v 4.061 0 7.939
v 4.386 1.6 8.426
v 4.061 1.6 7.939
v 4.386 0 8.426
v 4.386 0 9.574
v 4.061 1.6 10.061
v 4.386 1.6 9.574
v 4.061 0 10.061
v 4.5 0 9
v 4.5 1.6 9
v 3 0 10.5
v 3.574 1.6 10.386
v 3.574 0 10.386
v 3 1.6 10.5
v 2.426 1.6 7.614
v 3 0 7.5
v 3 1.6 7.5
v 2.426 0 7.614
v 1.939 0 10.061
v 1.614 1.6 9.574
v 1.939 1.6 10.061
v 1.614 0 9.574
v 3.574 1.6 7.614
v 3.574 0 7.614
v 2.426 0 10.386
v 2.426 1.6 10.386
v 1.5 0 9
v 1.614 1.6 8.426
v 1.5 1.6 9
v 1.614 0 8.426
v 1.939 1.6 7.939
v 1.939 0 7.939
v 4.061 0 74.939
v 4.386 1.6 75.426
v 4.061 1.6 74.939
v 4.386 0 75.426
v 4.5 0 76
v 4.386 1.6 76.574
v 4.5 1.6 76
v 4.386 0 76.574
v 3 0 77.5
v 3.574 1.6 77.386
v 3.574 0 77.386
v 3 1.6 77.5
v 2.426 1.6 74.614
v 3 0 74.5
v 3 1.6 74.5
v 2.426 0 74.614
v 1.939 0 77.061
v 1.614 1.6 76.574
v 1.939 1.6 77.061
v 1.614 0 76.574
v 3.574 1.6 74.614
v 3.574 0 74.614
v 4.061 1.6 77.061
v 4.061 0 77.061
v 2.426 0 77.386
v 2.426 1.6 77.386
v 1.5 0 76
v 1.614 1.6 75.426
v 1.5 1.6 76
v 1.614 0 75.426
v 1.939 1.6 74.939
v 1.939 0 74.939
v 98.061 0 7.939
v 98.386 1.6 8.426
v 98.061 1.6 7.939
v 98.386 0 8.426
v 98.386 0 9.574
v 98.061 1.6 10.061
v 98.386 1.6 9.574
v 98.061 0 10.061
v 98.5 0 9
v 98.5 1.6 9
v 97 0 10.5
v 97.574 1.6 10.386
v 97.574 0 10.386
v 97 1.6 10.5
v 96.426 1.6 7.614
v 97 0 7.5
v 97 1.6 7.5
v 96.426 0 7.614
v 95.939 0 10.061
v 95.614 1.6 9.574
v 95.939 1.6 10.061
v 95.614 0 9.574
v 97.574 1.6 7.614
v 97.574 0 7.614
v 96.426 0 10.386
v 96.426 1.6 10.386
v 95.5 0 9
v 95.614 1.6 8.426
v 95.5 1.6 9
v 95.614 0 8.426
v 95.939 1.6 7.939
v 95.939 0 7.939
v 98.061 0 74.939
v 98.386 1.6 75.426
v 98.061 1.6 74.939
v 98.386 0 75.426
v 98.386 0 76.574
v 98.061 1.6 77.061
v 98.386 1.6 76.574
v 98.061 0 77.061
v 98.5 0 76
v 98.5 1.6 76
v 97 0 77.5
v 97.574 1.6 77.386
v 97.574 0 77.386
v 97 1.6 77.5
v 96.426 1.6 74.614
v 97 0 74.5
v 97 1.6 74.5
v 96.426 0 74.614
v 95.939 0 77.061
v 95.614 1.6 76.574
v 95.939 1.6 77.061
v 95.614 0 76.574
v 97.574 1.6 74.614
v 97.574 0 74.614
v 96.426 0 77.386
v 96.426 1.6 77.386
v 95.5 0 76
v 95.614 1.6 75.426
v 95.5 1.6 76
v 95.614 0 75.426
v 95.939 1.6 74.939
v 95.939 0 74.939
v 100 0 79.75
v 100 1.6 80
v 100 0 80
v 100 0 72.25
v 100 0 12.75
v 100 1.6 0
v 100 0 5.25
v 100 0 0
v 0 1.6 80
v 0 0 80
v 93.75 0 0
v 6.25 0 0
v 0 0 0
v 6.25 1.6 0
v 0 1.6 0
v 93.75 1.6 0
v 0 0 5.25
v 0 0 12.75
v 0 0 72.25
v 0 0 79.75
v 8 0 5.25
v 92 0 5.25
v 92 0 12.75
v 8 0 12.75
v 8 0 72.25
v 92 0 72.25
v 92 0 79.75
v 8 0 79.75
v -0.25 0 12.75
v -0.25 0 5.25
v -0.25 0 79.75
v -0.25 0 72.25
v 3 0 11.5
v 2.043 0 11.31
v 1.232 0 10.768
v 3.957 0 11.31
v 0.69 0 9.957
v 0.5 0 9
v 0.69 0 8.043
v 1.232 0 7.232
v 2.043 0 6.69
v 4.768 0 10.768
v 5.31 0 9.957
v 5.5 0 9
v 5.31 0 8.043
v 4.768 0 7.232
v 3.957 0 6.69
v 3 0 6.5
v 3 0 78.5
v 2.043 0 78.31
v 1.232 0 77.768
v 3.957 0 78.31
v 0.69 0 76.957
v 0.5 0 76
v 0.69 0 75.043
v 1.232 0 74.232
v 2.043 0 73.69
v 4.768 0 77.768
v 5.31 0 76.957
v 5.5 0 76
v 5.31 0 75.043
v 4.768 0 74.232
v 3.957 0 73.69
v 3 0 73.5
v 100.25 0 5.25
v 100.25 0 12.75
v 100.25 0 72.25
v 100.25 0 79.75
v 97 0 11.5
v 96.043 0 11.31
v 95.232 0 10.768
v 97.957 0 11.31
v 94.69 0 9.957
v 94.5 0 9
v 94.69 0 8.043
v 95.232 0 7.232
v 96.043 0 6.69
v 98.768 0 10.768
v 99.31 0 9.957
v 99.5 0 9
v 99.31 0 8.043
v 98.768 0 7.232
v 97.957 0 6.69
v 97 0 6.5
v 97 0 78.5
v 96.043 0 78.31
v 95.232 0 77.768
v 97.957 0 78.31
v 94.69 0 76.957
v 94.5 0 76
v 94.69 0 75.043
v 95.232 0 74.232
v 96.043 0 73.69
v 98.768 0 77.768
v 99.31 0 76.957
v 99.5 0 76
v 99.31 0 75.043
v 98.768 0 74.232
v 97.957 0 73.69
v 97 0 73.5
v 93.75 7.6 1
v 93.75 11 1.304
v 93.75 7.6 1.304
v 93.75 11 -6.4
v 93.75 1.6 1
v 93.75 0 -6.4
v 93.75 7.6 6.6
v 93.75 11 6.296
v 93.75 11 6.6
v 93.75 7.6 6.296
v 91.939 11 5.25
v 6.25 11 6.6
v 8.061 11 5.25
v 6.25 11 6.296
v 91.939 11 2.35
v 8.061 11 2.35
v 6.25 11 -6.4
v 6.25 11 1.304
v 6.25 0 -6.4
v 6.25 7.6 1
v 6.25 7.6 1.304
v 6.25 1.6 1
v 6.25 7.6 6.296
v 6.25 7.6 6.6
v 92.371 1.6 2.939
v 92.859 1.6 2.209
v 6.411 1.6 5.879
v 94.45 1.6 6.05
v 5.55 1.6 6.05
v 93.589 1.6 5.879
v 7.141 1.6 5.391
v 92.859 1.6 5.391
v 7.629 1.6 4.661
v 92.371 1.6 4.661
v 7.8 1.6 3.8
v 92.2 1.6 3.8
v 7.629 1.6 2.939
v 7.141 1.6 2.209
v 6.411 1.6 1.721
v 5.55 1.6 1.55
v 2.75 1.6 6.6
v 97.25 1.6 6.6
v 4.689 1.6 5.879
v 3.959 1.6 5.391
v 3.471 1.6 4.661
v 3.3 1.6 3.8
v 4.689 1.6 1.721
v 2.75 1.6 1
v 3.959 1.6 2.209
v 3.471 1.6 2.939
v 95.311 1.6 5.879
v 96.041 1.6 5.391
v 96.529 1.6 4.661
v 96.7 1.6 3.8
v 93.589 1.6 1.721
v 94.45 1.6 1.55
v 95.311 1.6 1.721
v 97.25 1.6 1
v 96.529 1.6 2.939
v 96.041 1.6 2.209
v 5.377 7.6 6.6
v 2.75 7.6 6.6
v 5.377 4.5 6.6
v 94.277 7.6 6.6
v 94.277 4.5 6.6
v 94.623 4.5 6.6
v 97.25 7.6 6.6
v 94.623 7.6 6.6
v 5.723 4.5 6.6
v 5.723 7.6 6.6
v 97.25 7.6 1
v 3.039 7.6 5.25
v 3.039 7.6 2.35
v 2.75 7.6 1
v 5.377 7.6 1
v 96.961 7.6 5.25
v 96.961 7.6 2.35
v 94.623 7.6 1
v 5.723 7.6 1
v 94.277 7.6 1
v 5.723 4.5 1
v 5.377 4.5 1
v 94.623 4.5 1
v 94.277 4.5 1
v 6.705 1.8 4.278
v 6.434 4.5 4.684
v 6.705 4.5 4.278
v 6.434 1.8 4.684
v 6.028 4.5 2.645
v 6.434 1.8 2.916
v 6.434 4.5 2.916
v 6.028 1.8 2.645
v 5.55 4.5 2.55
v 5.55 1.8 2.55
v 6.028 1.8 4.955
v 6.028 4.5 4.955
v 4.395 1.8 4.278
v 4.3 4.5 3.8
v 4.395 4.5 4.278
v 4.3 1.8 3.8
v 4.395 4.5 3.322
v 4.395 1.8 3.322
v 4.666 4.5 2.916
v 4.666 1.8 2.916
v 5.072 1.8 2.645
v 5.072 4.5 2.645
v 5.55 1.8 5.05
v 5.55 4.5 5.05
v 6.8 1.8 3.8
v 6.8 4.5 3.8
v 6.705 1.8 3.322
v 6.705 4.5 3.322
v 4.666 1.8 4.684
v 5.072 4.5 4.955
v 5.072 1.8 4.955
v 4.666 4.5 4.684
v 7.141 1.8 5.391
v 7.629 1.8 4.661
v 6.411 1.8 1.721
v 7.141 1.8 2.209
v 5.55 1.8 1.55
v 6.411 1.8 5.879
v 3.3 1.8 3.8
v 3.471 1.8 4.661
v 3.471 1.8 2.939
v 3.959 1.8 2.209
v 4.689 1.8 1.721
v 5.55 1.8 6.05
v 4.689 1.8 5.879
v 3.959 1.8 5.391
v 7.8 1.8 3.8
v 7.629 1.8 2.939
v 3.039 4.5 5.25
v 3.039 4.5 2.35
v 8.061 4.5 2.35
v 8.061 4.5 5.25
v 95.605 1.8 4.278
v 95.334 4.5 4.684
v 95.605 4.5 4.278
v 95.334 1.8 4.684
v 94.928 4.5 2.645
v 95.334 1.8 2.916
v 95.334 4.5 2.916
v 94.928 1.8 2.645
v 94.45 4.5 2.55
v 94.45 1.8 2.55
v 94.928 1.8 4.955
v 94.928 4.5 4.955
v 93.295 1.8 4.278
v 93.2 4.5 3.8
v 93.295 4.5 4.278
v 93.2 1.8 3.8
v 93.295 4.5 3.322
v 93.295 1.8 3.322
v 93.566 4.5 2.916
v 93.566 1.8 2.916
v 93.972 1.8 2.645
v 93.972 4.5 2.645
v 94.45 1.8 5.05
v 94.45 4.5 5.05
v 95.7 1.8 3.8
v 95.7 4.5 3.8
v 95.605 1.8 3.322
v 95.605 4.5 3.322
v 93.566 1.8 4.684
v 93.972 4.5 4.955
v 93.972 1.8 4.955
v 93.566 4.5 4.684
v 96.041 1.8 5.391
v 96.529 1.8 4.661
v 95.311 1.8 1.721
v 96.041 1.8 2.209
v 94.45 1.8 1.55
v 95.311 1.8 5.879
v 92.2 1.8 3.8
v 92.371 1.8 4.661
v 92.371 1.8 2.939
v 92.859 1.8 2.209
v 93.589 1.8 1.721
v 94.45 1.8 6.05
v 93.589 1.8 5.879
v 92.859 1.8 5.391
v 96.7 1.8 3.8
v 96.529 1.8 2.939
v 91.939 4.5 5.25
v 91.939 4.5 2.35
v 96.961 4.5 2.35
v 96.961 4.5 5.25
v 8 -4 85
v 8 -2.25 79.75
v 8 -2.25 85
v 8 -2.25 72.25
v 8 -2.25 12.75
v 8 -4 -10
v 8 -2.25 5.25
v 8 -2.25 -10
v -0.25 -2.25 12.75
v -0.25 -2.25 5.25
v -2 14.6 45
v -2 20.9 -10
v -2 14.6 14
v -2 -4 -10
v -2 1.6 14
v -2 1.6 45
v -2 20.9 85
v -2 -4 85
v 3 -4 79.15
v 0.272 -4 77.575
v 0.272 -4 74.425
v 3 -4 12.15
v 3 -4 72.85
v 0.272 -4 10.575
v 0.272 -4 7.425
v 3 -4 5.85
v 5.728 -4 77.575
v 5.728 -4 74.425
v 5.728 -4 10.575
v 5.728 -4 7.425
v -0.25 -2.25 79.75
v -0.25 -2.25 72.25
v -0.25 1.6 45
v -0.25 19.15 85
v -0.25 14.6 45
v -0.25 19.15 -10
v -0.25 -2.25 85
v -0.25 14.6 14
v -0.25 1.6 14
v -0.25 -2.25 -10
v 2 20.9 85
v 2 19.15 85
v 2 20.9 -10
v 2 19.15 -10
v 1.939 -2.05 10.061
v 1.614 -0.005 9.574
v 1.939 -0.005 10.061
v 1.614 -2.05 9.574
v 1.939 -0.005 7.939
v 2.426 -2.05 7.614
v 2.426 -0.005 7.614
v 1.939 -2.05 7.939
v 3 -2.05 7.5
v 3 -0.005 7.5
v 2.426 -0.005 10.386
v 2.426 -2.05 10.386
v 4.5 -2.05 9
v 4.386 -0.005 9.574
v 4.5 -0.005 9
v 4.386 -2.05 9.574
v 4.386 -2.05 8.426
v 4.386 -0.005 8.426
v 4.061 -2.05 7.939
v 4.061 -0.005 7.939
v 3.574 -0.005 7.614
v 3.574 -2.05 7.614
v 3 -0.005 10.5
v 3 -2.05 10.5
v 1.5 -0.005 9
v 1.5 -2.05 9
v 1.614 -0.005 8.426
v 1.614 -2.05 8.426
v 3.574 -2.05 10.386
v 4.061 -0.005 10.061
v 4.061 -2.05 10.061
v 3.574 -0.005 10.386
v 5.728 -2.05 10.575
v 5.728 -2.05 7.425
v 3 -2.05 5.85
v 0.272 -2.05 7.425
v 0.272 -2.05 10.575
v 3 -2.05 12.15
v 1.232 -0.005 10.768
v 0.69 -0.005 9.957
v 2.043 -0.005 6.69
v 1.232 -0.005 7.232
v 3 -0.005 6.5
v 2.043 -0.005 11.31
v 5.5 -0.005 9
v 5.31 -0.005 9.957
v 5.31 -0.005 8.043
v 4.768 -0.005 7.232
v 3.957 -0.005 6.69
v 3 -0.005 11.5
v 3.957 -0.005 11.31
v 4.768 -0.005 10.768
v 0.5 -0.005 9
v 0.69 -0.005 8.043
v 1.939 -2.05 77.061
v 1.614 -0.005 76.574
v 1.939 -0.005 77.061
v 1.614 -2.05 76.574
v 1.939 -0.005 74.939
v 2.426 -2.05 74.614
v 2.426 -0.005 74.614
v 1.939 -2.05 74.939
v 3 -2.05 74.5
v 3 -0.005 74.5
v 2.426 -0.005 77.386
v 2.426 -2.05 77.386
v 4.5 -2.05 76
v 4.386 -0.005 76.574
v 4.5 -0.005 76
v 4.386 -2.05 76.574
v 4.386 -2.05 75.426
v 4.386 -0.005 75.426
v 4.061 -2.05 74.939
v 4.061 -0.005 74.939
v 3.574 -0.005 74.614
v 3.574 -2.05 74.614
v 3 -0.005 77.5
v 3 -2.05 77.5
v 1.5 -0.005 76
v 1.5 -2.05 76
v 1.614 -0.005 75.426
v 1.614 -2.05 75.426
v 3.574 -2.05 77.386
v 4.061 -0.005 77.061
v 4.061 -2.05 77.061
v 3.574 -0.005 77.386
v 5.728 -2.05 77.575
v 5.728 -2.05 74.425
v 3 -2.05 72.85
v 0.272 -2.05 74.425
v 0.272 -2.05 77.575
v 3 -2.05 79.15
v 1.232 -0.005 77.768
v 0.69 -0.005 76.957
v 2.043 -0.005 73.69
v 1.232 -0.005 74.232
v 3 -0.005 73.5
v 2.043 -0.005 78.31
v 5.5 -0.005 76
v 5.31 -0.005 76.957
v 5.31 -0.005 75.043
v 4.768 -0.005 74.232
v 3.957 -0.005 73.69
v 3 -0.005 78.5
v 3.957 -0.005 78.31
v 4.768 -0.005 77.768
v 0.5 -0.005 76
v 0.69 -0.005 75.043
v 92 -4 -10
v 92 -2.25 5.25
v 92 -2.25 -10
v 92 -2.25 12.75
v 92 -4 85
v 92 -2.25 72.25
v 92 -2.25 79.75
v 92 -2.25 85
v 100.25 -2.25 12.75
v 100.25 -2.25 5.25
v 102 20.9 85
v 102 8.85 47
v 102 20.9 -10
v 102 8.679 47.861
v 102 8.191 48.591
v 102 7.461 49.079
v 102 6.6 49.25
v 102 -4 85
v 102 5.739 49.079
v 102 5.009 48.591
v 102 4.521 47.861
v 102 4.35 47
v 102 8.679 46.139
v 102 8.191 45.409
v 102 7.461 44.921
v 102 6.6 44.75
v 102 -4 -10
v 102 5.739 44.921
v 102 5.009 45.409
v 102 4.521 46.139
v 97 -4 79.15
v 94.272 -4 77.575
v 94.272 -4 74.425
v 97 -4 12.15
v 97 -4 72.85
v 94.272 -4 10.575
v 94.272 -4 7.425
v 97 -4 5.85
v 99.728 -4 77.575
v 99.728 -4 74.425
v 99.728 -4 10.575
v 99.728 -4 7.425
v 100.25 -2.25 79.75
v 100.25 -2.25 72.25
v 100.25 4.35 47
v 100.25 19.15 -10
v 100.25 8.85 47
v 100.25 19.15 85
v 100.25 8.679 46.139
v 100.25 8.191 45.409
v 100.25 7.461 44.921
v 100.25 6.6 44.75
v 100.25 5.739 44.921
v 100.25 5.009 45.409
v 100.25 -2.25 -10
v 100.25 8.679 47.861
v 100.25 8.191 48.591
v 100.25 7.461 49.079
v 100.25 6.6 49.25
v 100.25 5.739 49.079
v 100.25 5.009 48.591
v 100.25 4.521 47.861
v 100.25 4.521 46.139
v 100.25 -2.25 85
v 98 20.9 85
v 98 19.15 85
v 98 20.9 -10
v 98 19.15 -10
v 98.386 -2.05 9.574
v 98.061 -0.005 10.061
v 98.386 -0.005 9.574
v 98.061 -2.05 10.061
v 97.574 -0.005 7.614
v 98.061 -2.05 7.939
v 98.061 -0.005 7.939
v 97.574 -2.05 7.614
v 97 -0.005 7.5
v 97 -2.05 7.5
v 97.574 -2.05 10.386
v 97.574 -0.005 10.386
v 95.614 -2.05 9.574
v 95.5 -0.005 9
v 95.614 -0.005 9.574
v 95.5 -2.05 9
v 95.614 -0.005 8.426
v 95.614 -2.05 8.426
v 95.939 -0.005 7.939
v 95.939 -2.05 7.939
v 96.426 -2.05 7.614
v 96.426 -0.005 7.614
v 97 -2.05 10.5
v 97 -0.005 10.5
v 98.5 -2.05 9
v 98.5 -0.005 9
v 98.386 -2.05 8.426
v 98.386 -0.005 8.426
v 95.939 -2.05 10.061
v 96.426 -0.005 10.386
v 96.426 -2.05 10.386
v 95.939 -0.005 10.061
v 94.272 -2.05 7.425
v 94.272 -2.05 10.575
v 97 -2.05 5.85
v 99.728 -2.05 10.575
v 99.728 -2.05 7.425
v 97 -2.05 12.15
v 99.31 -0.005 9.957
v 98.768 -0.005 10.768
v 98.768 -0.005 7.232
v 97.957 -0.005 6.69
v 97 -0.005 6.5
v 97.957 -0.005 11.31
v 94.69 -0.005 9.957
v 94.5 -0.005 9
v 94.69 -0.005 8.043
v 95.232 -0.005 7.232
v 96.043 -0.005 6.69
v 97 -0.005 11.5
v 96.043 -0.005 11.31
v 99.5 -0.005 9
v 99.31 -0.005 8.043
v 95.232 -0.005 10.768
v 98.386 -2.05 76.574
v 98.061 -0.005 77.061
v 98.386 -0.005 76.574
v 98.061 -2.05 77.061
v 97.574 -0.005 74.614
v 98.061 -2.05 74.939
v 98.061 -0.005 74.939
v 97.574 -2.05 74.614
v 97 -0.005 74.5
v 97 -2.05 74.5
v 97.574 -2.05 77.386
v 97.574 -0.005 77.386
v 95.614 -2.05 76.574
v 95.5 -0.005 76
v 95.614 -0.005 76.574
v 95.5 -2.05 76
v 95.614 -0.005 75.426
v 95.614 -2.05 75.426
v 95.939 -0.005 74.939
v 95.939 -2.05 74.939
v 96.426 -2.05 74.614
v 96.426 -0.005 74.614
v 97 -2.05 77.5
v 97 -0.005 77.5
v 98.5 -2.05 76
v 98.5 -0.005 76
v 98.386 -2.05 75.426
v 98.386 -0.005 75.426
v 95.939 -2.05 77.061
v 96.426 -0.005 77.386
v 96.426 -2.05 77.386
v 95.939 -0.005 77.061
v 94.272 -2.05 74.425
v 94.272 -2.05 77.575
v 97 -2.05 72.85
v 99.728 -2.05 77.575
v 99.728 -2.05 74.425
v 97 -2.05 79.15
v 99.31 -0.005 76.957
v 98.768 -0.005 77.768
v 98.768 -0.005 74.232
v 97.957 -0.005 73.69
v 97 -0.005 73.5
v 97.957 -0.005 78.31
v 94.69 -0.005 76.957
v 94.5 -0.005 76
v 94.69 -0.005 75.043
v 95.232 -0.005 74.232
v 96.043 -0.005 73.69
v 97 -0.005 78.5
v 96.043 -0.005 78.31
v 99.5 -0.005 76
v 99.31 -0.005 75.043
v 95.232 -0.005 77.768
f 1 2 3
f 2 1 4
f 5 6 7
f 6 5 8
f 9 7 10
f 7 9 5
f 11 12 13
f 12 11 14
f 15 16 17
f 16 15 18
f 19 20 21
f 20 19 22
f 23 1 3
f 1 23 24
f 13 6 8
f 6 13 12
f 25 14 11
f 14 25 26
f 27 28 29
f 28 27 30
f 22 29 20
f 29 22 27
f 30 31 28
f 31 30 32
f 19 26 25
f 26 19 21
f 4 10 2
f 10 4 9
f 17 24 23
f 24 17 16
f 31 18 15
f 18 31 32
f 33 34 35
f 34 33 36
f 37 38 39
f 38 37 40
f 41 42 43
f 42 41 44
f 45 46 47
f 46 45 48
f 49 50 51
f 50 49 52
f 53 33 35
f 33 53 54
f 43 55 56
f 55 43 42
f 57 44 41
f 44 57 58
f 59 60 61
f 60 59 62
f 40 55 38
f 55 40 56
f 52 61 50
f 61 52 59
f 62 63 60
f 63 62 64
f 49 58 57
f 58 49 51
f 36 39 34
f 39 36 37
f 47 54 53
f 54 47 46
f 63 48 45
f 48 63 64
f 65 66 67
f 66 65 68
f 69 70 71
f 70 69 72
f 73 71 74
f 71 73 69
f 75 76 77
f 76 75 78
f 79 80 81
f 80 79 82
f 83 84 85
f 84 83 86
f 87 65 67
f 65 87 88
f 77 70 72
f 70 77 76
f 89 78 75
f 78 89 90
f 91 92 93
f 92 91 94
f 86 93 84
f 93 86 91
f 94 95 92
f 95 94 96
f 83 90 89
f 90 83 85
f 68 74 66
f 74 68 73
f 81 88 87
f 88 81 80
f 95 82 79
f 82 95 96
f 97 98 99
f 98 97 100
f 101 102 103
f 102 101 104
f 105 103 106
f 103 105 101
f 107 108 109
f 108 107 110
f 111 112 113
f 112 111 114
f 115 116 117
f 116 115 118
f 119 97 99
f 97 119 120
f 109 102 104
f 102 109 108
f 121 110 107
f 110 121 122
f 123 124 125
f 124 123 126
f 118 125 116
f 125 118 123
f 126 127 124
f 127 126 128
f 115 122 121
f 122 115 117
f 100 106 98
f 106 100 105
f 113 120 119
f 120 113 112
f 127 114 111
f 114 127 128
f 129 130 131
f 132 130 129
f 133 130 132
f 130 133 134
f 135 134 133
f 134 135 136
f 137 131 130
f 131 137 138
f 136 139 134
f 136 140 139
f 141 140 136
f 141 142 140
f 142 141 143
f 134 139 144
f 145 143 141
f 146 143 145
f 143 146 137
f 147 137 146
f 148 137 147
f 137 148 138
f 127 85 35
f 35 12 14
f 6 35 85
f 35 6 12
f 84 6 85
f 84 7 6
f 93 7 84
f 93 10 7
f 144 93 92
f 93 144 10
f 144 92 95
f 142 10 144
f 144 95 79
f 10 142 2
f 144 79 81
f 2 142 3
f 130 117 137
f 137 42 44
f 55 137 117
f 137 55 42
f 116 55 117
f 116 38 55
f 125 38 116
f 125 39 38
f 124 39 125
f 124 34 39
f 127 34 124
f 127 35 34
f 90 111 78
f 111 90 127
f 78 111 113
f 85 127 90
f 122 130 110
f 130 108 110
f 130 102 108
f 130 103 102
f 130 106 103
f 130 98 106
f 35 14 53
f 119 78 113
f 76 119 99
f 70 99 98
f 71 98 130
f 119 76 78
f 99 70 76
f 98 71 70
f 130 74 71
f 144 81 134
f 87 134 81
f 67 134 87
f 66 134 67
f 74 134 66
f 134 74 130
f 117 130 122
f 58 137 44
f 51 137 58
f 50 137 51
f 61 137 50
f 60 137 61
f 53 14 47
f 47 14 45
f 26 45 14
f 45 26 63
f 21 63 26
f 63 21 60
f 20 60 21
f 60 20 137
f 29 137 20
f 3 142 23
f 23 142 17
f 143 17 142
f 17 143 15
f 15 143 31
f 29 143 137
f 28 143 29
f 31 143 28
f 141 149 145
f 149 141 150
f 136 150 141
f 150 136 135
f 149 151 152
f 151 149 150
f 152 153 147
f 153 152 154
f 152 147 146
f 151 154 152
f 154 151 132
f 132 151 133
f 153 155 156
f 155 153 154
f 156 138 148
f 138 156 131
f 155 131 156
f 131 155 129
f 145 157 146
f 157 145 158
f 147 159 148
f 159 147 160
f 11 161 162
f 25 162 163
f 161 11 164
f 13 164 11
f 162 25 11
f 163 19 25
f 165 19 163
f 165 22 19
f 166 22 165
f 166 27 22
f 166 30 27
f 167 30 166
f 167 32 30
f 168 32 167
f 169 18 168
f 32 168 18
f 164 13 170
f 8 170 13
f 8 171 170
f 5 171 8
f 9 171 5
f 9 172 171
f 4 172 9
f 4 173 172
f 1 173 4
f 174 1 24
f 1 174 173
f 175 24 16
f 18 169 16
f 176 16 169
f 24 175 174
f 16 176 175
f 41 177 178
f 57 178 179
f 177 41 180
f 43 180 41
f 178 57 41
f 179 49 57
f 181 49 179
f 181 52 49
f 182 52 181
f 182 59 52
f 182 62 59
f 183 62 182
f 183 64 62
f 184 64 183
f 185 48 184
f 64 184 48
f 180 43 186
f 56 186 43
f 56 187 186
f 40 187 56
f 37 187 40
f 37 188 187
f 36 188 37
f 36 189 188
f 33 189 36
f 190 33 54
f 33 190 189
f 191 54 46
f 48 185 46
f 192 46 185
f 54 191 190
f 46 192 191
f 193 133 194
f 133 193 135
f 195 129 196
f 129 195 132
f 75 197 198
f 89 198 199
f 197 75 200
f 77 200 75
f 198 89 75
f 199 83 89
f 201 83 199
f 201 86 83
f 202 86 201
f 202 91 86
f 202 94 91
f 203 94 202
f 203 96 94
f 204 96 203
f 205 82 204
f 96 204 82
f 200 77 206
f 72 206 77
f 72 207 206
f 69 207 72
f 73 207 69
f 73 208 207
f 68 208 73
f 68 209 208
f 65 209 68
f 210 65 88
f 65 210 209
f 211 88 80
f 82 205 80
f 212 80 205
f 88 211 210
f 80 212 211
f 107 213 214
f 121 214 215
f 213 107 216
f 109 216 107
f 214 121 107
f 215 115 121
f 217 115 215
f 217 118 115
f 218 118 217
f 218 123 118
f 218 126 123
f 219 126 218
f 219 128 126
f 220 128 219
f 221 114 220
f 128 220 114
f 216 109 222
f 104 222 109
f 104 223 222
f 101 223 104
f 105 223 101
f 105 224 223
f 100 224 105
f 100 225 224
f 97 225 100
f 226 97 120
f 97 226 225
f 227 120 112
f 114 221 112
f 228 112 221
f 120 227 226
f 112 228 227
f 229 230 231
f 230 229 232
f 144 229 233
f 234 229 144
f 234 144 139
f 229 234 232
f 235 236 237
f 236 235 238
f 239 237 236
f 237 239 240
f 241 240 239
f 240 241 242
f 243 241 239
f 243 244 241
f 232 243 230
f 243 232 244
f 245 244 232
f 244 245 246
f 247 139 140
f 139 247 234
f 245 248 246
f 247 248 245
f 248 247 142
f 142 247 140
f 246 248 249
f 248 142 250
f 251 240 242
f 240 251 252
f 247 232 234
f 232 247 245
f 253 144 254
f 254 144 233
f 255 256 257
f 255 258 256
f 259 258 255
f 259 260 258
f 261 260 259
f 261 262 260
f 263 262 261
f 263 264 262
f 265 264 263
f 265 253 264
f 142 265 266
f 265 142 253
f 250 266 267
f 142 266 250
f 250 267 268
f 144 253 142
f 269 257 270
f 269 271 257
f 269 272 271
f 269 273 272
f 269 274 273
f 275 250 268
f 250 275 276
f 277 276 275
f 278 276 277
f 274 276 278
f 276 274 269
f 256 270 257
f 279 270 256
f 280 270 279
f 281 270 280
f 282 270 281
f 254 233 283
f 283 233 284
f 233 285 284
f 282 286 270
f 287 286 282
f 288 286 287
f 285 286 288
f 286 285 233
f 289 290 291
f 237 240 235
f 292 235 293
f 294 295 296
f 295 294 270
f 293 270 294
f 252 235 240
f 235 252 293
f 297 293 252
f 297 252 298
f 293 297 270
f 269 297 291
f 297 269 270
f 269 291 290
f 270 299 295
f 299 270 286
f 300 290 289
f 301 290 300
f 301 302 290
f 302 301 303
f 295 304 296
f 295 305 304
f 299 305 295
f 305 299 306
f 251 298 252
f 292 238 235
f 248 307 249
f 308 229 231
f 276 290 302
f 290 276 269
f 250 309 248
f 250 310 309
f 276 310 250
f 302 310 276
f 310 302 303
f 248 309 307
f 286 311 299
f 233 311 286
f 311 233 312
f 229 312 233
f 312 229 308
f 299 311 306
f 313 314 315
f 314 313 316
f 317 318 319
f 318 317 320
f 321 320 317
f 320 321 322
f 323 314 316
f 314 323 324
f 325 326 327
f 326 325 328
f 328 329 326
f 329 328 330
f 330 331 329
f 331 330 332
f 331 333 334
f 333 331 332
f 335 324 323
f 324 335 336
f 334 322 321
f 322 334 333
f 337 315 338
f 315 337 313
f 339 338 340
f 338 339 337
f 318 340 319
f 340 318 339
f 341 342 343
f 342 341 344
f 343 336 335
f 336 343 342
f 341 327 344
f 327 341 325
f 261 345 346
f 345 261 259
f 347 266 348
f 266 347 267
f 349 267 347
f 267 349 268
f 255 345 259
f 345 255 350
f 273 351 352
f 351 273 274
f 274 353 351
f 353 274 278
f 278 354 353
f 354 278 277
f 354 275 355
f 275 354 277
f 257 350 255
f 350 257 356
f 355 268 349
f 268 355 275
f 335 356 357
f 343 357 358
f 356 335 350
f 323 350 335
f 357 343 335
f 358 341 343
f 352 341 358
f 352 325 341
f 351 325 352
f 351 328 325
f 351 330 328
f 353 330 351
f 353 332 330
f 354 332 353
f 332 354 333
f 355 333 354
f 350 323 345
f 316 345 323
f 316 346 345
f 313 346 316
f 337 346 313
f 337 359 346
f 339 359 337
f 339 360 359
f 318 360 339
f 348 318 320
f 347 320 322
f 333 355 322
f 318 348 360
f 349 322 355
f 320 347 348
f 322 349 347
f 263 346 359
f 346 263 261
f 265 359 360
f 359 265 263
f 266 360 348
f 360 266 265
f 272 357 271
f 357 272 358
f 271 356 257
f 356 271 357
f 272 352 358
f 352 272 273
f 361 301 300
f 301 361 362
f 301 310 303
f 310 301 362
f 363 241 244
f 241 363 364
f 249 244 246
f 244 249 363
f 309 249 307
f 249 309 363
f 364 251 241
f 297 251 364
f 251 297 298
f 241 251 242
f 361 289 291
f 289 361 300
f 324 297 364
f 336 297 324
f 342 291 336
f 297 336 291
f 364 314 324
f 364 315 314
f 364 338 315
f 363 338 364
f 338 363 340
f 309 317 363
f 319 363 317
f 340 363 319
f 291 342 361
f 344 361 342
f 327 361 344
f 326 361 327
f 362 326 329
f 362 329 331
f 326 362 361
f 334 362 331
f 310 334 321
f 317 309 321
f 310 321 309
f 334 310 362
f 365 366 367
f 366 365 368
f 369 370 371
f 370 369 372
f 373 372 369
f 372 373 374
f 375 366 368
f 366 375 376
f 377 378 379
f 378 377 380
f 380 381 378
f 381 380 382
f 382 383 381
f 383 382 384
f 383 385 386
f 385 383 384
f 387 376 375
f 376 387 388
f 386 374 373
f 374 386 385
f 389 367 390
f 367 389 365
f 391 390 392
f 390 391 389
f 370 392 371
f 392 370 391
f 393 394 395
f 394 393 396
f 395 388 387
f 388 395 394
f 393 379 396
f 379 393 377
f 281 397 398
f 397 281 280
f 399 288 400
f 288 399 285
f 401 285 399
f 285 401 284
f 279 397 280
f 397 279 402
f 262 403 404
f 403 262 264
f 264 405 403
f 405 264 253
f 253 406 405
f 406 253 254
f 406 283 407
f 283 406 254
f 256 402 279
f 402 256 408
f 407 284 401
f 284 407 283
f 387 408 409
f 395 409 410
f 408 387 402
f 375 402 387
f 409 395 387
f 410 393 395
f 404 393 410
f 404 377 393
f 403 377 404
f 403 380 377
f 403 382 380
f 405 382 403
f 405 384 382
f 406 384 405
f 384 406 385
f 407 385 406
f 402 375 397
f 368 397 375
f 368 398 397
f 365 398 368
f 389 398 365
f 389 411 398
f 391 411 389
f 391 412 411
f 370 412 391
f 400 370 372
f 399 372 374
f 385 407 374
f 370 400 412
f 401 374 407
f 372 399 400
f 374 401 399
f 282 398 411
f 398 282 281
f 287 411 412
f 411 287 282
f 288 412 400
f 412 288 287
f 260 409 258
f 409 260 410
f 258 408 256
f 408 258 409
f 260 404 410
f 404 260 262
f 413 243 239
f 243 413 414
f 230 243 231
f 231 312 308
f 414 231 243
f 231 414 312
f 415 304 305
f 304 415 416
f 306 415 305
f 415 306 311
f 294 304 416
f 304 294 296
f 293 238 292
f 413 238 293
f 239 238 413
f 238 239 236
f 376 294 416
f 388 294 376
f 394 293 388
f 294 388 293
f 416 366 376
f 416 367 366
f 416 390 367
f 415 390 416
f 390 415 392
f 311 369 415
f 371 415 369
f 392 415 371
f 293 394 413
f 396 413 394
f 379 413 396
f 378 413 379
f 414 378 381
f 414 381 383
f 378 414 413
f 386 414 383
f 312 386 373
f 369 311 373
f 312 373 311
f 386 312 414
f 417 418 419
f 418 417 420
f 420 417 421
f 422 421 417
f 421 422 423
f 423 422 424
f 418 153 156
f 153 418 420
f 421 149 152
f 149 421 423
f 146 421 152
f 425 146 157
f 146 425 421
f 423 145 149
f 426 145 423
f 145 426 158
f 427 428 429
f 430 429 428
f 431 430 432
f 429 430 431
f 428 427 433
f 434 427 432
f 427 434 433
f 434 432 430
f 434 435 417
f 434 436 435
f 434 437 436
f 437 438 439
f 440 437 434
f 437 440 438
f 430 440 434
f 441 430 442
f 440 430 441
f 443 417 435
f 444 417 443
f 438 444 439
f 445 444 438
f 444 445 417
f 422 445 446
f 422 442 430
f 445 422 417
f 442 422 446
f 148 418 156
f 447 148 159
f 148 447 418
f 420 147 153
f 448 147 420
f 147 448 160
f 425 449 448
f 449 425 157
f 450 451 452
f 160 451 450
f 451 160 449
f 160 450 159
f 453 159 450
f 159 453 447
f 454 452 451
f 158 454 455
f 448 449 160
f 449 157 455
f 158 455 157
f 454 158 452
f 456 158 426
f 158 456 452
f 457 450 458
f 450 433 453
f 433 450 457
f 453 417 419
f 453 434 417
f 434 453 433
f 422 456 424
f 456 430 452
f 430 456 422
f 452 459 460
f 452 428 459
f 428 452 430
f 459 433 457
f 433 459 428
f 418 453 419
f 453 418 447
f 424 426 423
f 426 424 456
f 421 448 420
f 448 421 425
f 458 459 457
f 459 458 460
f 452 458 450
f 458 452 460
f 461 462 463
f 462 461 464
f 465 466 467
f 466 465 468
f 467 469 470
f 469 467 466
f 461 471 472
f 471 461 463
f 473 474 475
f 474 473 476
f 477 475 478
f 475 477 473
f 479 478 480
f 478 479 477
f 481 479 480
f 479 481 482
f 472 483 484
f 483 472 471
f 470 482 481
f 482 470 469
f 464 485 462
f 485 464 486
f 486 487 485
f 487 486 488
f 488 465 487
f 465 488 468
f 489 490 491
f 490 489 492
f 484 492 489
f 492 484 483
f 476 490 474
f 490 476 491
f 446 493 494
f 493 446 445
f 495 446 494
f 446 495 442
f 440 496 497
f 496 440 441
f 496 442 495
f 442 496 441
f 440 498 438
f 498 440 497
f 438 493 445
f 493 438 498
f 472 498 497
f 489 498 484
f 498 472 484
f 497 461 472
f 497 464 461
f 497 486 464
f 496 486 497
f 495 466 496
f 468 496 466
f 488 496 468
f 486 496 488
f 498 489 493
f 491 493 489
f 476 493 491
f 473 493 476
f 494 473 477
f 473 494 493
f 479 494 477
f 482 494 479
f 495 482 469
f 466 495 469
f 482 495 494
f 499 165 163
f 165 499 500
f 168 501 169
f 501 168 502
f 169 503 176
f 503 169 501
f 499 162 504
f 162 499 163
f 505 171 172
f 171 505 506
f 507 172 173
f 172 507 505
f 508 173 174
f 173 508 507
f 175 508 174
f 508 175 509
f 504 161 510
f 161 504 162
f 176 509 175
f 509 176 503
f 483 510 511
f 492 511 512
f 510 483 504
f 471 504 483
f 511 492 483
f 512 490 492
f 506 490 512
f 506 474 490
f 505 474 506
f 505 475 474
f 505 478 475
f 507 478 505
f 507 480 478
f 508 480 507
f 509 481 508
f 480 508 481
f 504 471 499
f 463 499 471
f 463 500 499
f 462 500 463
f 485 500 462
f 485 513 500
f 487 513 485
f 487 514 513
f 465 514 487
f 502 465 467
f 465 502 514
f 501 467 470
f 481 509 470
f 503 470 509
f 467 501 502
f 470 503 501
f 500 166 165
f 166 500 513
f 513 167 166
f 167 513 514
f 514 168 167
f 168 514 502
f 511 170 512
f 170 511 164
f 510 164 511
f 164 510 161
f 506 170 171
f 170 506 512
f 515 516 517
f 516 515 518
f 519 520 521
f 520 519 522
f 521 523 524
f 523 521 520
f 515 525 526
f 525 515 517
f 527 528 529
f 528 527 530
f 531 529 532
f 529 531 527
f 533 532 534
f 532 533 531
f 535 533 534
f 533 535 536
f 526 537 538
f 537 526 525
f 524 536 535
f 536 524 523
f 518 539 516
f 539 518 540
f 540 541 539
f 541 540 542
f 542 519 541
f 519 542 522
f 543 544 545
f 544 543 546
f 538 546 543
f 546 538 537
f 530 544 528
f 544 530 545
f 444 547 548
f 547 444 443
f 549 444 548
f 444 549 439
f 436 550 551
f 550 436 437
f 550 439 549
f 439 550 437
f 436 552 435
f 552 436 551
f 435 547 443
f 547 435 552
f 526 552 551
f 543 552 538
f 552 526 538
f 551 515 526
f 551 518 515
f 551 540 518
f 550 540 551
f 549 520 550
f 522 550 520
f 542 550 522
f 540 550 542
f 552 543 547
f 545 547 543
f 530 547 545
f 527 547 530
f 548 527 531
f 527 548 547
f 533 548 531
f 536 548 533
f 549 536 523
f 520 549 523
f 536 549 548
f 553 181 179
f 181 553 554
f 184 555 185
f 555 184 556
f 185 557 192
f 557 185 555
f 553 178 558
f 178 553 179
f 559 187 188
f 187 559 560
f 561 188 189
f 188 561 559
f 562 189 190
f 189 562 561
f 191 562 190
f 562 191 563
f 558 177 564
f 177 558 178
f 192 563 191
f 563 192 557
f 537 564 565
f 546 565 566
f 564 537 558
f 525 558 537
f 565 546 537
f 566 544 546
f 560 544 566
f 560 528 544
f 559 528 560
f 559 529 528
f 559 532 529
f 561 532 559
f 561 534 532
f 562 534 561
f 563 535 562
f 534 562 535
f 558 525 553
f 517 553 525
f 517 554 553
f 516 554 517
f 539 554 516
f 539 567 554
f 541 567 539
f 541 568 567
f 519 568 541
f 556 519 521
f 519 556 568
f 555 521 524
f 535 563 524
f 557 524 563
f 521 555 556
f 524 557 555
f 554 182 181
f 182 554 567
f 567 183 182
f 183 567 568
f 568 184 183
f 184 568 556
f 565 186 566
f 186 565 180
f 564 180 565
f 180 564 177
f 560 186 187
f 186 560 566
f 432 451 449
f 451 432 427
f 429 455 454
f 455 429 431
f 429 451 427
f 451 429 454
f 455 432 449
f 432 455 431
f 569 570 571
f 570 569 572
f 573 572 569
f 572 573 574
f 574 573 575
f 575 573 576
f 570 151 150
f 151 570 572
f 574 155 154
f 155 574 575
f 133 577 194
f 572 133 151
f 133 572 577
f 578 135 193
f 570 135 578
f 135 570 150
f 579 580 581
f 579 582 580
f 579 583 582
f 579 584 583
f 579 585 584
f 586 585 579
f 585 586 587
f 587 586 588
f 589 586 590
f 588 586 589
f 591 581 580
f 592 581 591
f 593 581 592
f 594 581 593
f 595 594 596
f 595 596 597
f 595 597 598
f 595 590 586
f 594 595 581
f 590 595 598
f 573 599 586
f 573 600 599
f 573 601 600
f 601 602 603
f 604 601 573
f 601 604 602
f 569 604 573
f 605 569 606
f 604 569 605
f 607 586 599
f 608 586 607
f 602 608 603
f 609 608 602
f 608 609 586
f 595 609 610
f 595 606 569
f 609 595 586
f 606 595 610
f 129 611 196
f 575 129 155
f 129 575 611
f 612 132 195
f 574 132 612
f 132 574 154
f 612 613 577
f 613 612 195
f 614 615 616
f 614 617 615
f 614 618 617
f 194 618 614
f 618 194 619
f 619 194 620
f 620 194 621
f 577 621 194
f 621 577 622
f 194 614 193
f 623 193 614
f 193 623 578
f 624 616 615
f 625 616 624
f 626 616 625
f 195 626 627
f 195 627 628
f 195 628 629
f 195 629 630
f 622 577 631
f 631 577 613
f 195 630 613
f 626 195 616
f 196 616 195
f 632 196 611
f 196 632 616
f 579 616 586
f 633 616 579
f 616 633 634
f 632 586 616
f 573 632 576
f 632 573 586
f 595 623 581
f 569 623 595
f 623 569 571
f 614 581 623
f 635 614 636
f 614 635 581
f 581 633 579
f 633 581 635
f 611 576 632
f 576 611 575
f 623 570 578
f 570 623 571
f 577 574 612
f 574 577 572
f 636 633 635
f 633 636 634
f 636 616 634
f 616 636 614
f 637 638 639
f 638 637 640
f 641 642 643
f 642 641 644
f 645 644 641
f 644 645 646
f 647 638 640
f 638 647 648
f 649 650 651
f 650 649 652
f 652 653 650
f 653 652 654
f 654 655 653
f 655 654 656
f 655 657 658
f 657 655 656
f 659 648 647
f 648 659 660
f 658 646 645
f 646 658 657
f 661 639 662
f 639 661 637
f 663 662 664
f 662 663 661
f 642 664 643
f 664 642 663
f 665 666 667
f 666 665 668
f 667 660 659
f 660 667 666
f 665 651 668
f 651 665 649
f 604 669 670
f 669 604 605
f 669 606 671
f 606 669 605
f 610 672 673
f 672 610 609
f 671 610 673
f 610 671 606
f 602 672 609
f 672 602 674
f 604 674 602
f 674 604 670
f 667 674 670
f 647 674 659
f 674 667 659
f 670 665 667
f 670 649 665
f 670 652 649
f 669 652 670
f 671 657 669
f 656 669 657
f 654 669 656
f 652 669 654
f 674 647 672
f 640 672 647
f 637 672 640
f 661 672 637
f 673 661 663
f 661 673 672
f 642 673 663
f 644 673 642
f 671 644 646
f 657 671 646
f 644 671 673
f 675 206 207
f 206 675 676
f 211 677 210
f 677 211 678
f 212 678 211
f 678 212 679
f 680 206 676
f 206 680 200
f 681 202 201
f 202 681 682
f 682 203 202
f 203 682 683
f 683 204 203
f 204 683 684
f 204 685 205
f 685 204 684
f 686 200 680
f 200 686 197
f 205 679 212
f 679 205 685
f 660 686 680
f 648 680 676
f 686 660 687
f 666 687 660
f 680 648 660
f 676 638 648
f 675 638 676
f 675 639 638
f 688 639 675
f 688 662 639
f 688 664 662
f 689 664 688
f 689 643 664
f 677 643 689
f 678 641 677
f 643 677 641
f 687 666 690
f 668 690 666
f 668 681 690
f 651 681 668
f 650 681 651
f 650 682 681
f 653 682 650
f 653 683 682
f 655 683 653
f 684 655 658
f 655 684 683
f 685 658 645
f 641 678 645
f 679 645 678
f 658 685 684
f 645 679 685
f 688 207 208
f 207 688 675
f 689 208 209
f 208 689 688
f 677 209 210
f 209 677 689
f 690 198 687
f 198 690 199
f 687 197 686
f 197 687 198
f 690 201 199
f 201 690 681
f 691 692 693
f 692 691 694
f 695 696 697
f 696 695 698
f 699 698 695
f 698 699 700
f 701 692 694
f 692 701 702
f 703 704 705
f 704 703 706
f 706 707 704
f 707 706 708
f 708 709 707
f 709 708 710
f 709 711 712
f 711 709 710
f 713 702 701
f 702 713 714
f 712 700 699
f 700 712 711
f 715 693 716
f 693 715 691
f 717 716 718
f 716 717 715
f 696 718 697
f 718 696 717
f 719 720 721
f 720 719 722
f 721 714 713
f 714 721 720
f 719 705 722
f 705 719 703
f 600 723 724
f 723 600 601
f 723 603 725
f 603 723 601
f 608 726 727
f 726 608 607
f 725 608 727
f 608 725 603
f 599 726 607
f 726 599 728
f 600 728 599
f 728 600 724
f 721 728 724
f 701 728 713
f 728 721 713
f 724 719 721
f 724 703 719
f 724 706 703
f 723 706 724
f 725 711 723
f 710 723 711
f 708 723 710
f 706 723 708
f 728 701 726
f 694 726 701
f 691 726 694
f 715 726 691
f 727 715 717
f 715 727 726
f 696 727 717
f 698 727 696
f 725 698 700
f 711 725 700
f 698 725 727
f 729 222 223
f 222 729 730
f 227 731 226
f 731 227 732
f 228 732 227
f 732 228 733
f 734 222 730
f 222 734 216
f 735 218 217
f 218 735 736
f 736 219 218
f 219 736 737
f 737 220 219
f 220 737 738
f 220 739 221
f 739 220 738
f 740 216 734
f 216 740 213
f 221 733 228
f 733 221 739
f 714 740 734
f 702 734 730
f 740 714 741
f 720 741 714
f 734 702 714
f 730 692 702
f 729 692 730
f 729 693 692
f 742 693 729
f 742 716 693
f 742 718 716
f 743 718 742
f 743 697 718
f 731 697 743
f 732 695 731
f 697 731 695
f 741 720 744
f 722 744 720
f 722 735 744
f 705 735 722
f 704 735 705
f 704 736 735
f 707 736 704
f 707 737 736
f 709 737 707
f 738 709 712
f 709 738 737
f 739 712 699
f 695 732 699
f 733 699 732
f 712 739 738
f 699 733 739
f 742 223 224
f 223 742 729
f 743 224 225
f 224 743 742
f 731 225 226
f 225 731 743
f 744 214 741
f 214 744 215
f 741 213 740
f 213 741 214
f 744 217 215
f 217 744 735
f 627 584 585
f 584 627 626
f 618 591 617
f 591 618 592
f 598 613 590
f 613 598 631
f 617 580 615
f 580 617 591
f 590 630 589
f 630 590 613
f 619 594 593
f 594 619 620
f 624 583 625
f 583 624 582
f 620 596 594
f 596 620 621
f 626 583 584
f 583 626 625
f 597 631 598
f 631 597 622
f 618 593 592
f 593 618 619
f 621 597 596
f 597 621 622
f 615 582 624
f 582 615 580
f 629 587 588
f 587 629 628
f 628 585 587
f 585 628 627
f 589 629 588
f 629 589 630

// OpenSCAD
// file: ../library/din41612/din41612_male.scad
// din41612 male connector
// =======================

include <din41612_male_dim.scad>

use <../linurs/linurs_screw.scad>

module din41612_male(){ 
  // color("LightGrey")
  difference(){
    union(){
        translate([0,din41612_male_w1/2,din41612_male_h/2-din41612_male_h1])  
        cube([din41612_male_l1,
              din41612_male_w1,
              din41612_male_h],
             center=true);  
      translate([0,(din41612_male_w1-din41612_male_w)/2,(din41612_male_h-din41612_male_h1)/2]) 
        cube([din41612_male_l1,
              (din41612_male_w-din41612_male_w1),
              din41612_male_h-din41612_male_h1],
             center=true);  
      translate([0,din41612_male_w2/2+din41612_male_w1-din41612_male_w,din41612_male_h2/2])
        cube([din41612_male_l,
              din41612_male_w2,
              din41612_male_h2],
             center=true);  
    }
    for(i=[-1,1]){ // mounting holes
      translate([i*din41612_male_dl/2,
                 din41612_male_w1-din41612_male_w+din41612_male_w2/2, 
                 din41612_male_h1])
      rotate([180,0,90])screw_fix(
            w=din41612_male_h2, 
            d=M2_5, 
            type=head_cyl, 
            nut_sink=din41612_male_h,
            t=0);
    }
  }
}
din41612_male();  
// file: ../library/din41612/din41612_male_dim.scad
include <../linurs/linurs_screw_dim.scad>

// connector dimensions
din41612_male_l=94.5;    // lenght of the connector
din41612_male_l1=87.5;   // 
din41612_male_w=13;      // width of the connector
din41612_male_w1=6.4;    // 
din41612_male_w2=5.6;    // 
din41612_male_h=11;      // height of the connector
din41612_male_h1=1.6;    // 
din41612_male_h2=6;      // 

din41612_male_dl=88.9;   // distance between mounting holes
// file: ../library/din41612/din41612_female_dim.scad
include <../linurs/linurs_screw_dim.scad>

// connector dimensions
din41612_female_l=95;       // lenght of the connector
din41612_female_l1=85;      // lenght of the connector head
din41612_female_h=11.6;     // height of the connector
din41612_female_h1=5.2;     // height produced by the connector when pulgged in 
din41612_female_w=11;       // width of the connector
din41612_female_w1=8.5;     // width of the connector head

din41612_female_dl=90;      // distance between mounting holes
// file: ../pcb/pcb.scad
// pcb
// ===
// The pcb is the master object and has its 
// lower left corner solder side at the origin of the 
// coordinate system 

n=2;  // [1,2,3,4,5,6,7,8]
show_pcb="assemblies"; // [assemblies,assembly,pcb]

include <pcb_dim.scad>
include <../motherboard/motherboard_dim.scad>

use <../library/din41612/din41612_male.scad>

module pcb(){
  echo("pcb");  
  color("greenyellow")
  difference(){
    cube([pcb_l,pcb_h,pcb_w]); // pcb
    for(x=[-1,1]){ // mounting holes
      for(y=[pcb_wd1,pcb_wd1+pcb_wd]){
        translate([x*pcb_ld/2+pcb_l/2,0,y])
        rotate([90,0,0])
        cylinder(d=pcb_d,h=3*pcb_h,center=true,$fn=16);
      }
    }
  }
}

module pcb_assembly(){
  echo("pcb assembly");  
  pcb();  
  translate([pcb_l/2,pcb_h,0])  
  rotate([-90,0,0])din41612_male();  
}

module pcb_assemblies(n=1){
  echo("pcb assemblies"); 
  for(i=[0:n-1]){ // add the connectors
      echo(i);
      translate([0,step*i,0])
      pcb_assembly();
  }    
}    

if(show_pcb=="assemblies"){
  pcb_assemblies(n=n);
}

if(show_pcb=="assembly"){
  pcb_assembly();
}

if(show_pcb=="pcb"){
    // Move to center to create 2D drawings from top view 
    // with script OpenSCAD22d.py
    //
    rotate([90,0,180])
    //
    translate([-pcb_l/2,-pcb_h/2,-pcb_w/2])
    pcb();
}
// file: ../bracket/bracket.scad
// bracket
// =======
// A bracket of the elecbox module
// - type: 0 front bracket, 1 rear bracket
// - width 1..n in steps

// parameters for customizer
// bracket width
n=2; // [1,2,3,4,5,6,7,8]
// type
bracket="Front"; // [Front,Back]
// intermediate mounting holes
intermediate=false;  

include <../pcb/pcb_dim.scad>

include <../motherboard/motherboard_dim.scad>
include <../library/linurs/linurs_screw_dim.scad>
include <bracket_dim.scad>

use <../library/linurs/linurs_screw.scad>
    
module back_bracket(n=1, intermediate=false){
  mirror([1,0,0])       // mirror it if desired
  front_bracket(n=n, intermediate=intermediate); 
}
    
module front_bracket(n=1, intermediate=false){
  echo("bracket");  
  //color("White")
  intermediatestep=(intermediate)?step:0; 
  difference(){
    union(){
      translate([-bracket_h2/2-bracket_gap/2,
                 bracket_w(n)/2-bracket_w1,
                 bracket_l/2])  
      cube([bracket_h2,
            bracket_w(n),
            bracket_l],center=true); // create the bracket front
  
      translate([bracket_h/2-bracket_h2-bracket_gap/2,
                 bracket_t/2-bracket_w1,
                 bracket_l/2]) 
      cube([bracket_h,
            bracket_t,
            bracket_l],center=true); // U shape side of the screw
      
      translate([bracket_h1/2-bracket_h2-bracket_gap/2,
                 bracket_w(n)-bracket_w1-bracket_t/2,
                 bracket_l/2]) 
      cube([bracket_h1,
            bracket_t,
            bracket_l],center=true); // U shape where no screw  
      for(x=[1:n]){  // create the mounting hole cubes 
        for(z=[bracket_l1,
               bracket_l1+bracket_ld]){
          translate([ bracket_h/2-bracket_h2-bracket_gap/2,
                     -bracket_w1/2+(x-1)*intermediatestep,
                     z])
          cube([bracket_h,
                bracket_w1,
                bracket_l2],center=true);
        }
      }   
    }
    for(x=[1:n]){ // create the mounting hole 
      for(z=[bracket_l1,
             bracket_l1+bracket_ld]){
        translate([bracket_h3-bracket_h2-bracket_gap/2,
                  -bracket_w1/2+(x-1)*intermediatestep,
                   z])
        rotate([0,90,0])
        rotate([-90,0,0])
        screw_fix(w=bracket_w1,d=bracket_screw,type=head_no, t=bracket_screw_gap);
      }
    }
  }
}

if(bracket=="Front"){
  front_bracket(intermediate=intermediate,n=n);
}

if(bracket=="Back"){
  back_bracket(intermediate=intermediate,n=n);
}
// file: ../library/linurs/linurs_screw.scad
// Metric screws and nuts 
// urs@linurs.org 2019
// It is targeted for 3D printing applications. 
// To look realistic is not the goal (Example: Nuts do not have a hole)

include <linurs_screw_dim.scad>

d=0; //[0:M2_5,1:M3,2:M4,3:M5]
type=0;//[0:head_cyl,1:head_cnt,2:head_no,3:head_hex]
w=15; 
i=10;
nut_sink=0;
screw_sink=0; 
t=0.01;
fn=16;

/* [hex_bolt] */
show_hex_bolt=false;

/* [nut] */
show_nut=false;

/* [screw] */
show_screw=false;

/* [screw_fix] */
show_screw_fix=false;

/* [screw_cut] */
show_screw_cut=false;

/* [nut_cut] */
show_nut_cut=false;
wi=0; 
rot=false;

// functions used multiple times to position nuts and heads
function headh_cyl(d)=screw_cyl[d][1];  // height of cyl screw head
function headh_cnt(d)=screw_cyl[d][1];  // height of cnt screw head
function headh(d,type=head_cyl)=(type==head_cyl ? headh_cyl(d) : (type==head_cnt ? headh_cnt(d) : 0 )); // height of screw head 

function nuth(d)=screw_hex[d][2];   // height of hex nut

// head of a cylinder screw
module screw_head_cyl(d=M3, t=0)
{
  screwhd=screw_cyl[d][0]+t; // diameter of cylinder screw head
  cylinder(d=screwhd,h=headh(d=d, type=head_cyl), center=true,$fn=16); // screw head
}

// head of a countersunk screw
module screw_head_cnt(d=M3, t=0)
{
  screwd=screw_d[d]+t; 
  screwhd=screw_cnt[d][0]+t; // diameter of cylinder screw head
  cylinder(d1=screwd,d2=screwhd,h=headh(d=d,type=head_cnt), center=true,$fn=16); // screw head
}

// head of a hex screw
module screw_head_hex(d=M3, t=0)
{
    translate([0,0,-nuth(d)/2])nut(d=d, t=t);
}

// head of all screws
module screw_head(d=M3, type=head_cyl, t=0)
{ 
  if(type==head_cnt){
    screw_head_cnt(d=d, t=t);
  } else {
    if(type==head_cyl){
      screw_head_cyl(d=d, t=t);
    } else {
       if(type==head_hex){
           screw_head_hex(d=d, t=t); 
       } 
    }    
  }
}

// hex bolt 
module hex_bolt(d=M3, w=10, t=0)
{
  nutd=screw_hex[d][1]+t; // outer diameter of hex bolt
  cylinder(r=nutd/2,h=w+t, center=true,$fn=6); // nut
}

// nut 
module nut(d=M3, t=0)
{
  hex_bolt(d=d, w=nuth(d), t=t);    
}

// screw 
// w outer width of the screw = screw length + head 
module screw(w=10, d=M3, type=head_cyl, t=0){
  screwd=screw_d[d]+t;       // screw diameter
  cylinder(d=screwd, h=w, center=true,$fn=16); // screw thread length
  translate([0,0,w/2-headh(d=d,type=type)/2])
  screw_head(d=d,type=type, t=t);
}

// screw fix
// w outer width of the screw = screw length + head 
// sink additional material below to remove 
// raise additional material above to remove
module screw_fix(w=10, d=M3, type=head_cyl, screw_sink=0, nut_sink=0, t=0){
  screw(w=w, d=d, type=type, t=t);
  translate([0,0,-w/2+nuth(d)/2])
    nut(d=d,t=t);
  //additional material to be removed above the nut  
  translate([0,0,-(w+nut_sink)/2])hex_bolt(d=d,w=nut_sink+0.01,t=t);    
  //additional material to be removed above the screw head
  if(type==head_cnt){  
    translate([0,0,w/2+screw_sink])
    cylinder(d=screw_cnt[d][0]+t,h=screw_sink+0.01,center=true,$fn=16);
  }else{ 
    translate([0,0,(w+screw_sink)/2])
    cylinder(d=screw_cyl[d][0]+t,h=screw_sink+0.01,center=true,$fn=16);
  }     
}

// screw cut
// material to be extracted from object to slide in a counter sunk screw for fixation
// w height of the cut out
// i depth of the screw
module screw_cut(d=M3,w=20,i=10,t=0,fn=32){
    hsh=screw_cnt[d][1];
    ws=screw_cnt[d][0]+t;
    ds=screw_d[d]+t;
    
    translate([i/2,0,-(w-hsh)/2])
      cube([i,ws,hsh],center=true);
    
    translate([0,0,-(w-hsh)/2])
      cylinder(d=ws,h=hsh,center=true,$fn=32);
    
    translate([0,0,-(w-hsh)/2+hsh])
        cylinder(d2=ds, d1=ws, h=hsh,center=true,$fn=fn);
    
    cylinder(h=w, d=ds, center=true, $fn=fn);   
    
    translate([i/2,0,0]) 
        cube([i,ds,w],center=true);
    
    for(y=[-1,1]){
        translate([i/2,y*ds/2,-w/2+hsh])
            rotate([45,0,0])
            cube([i,sqrt(2)*(ws-ds)/2,sqrt(2)*(ws-ds)/2],center=true);
    }
}
//screw_cut();

// nut cut
// material to be extracted from object to slide in a nut for fixation
// w height of the cylinder
// i lenght of the inlet
module nut_cut(w=10, wi=0, d=M3, i=10, t=0, rot=false,type=head_cyl){ 
  r=(rot)?90:0;
  ds=(rot)?screw_hex[d][1]:screw_hex[d][0];
  rotate([0,0,r])nut(d,t);
  translate([i/2,0,0])
    cube([i,ds+t,nuth(d)+t],center=true);
  translate([0,0,-wi])
      if(type==head_cnt){    
          screw(w=w, d=d, type=type, t=t); 
        translate([0,0,w/2])
          cylinder(d=screw_cnt[d][0]+t,h=raise,center=true,$fn=16);
      }
      else{ 
          screw(w=w, d=d, type=type, t=t);   
  //      translate([0,0,0])
          //#cylinder(d=screw_cyl[d][0]+t,h=w,center=true,$fn=16);
      }       
}

if(show_hex_bolt==true){
   hex_bolt(d=d, w=w, t=t);
}

if(show_nut==true){
  nut(d=d, t=t);
}    

if(show_screw==true){
   screw(w=w, d=d, type=type, t=t);
}

if(show_screw_fix==true){
  screw_fix(w=w, d=d, type=type, nut_sink=nut_sink, screw_sink=screw_sink, t=t);
}

if(show_screw_cut==true){
  screw_cut(d=d,w=w,i=i,t=t,$fn=fn);
}    

if(show_nut_cut==true){
  nut_cut(w=w, wi=wi, d=d, i=i, t=t,rot=rot,type=type);
}  
// file: ../library/linurs/linurs_screw_dim.scad
// Metric screws and nuts 
// urs@linurs.org

// contains dimensions of linurs_screw and can be included in other 
// OpenScad files 

// Parameters in this file
// d screw diameter M2_5, M3, ... (enumeration with screw_d)
// t millimeters added to diameters 

// enumerations of metric threads
M2_5=0;
M3=1;
M4=2;
M5=3;

// enumerations screw head type
head_cyl=0; // cylinder
head_cnt=1; // countrsunk
head_no=2;  // no head at all
head_hex=3;  // no head at all

// screw diameters
screw_d=[
2.5, // M2.5
3.0, // M3
4.0, // M4
5.0  // M5
];

// sizes for hex nuts
screw_hex=[
//   s,   e,   h
 [ 5.0, 5.8, 1.7], // M2.5
 [ 5.5, 6.4, 2.0], // M3
 [ 7.0, 8.1, 2.8], // M4
 [ 8.0, 9.2, 3.5]  // M5
];

// sizes for cylinder screw heads
screw_cyl=[
//   d,   h
 [ 4.5, 1.6], // M2.5
 [ 5.5, 2.0], // M3
 [ 7.0, 2.6], // M4
 [ 8.5, 3.3]  // M5
];

// sizes for countersunk screw heads
screw_cnt=[
//   d,   h
 [ 4.7, 1.50], // M2.5
 [ 5.6, 1.65], // M3
 [ 7.4, 2.20], // M4
 [ 9.2, 2.50]  // M5
];
// file: ../motherboard/motherboard_dim.scad
include <../library/linurs/linurs_screw_dim.scad>
include <../library/din41612/din41612_female_dim.scad>
include <../library/din41612/din41612_male_dim.scad>
include <../pcb/pcb_dim.scad>
// motherboard pcb dimensions
motherboard_l=pcb_l;   // pcb width
motherboard_h=1.6;     // pcb thickness
step=25.4;             // distance between modules

function motherboard_w(n)=din41612_female_w+step*(n-1);

screw_motherboard_d=M2_5;
screw_motherboard_l=16;
motherboard_pass=0.5;// gap to fit screws 

motherboard_z_offset=-din41612_male_w1-din41612_female_h1-motherboard_h;
// file: ../bracket/bracket_dim.scad
// bracket

include <../pcb/pcb_dim.scad>
include <../motherboard/motherboard_dim.scad>
include <../library/linurs/linurs_screw_dim.scad>

bracket_screw=M2_5;   // hole for the screw

bracket_gap=0.5;      // gap between bracket to make sure it fits in the box
bracket_screw_gap=0.5;// gap to fit the screw

bracket_l=pcb_w+15;   // height of bracket
bracket_l1=19;        // hole l
bracket_l2=3*screw_d[bracket_screw];
bracket_ld=pcb_wd;    // hole distance

bracket_h=10;         // depth of the U shape at the side of the screw
bracket_h1=4;         // depth of the U shape at the side where no screw is 
bracket_h2=2-bracket_gap/2;   // thickness of bracket
bracket_h3=5;         // hole h

bracket_w1=4;         // height of the mounting hole cube
bracket_tn=2;         // thickness of bracket
bracket_t=bracket_tn-bracket_gap/2;  // thickness of bracket - gap

bracket_offset_z=-10;  // bracket offset in elecbox z axis

function bracket_w(n)=step*n-bracket_gap;
function bracket_w2(n)=step*n-2*bracket_tn;
// file: ../pcb/pcb_dim.scad
// The pcb is the master object of the project
// therefore no other include files from other objects
// are necessary

// pcb constants
pcb_l =100;  // lenght of the pcb
pcb_ld = 94; // hole distance 
pcb_w=80;    // height of the pcb
pcb_wd = 67; // hole distance
pcb_wd1 = 9; // hole to edge distance 
pcb_d=3;     // diameter of holes
pcb_h=1.6;   // thickness
// main file
// Uirt module
// ==========

Uirt="assembly"; // [assembly,front,back,print_front,print_back]

include <../pcb/pcb_dim.scad>
include <../bracket/bracket_dim.scad>
include <../motherboard/motherboard_dim.scad>
include <../library/linurs/linurs_screw_dim.scad>

use <../library/linurs/linurs_screw.scad>
use <../bracket/bracket.scad>
use <../pcb/pcb.scad>

module Uirt_back(){
    d1=4.5;
    h1=5;
    z1=47;
    difference(){
        translate([0,0,bracket_offset_z])back_bracket(n=1);
        
        translate([
          0,
          h1+pcb_h,
          z1])rotate([0,90,0])
          cylinder(h=bracket_h,d=d1,center=true, $fn=16); 
    }
}

module Uirt_front(){
    h1=13;
    w1=31;
    z1=14;
    
    difference(){
        translate([0,0,bracket_offset_z])front_bracket(n=1);
        
        translate([
          0,
          h1/2+pcb_h,
          z1+w1/2])
        cube([
          bracket_h,
          h1,
          w1],center=true);
    }
}

module Uirt_assembly(){
    pcb_assembly();
    Uirt_front();
    translate([pcb_l,0,0])Uirt_back();
}

if(Uirt=="front"){
  Uirt_front();
}

if(Uirt=="back"){
  Uirt_back();
}

if(Uirt=="assembly"){
  Uirt_assembly();
}

if(Uirt=="print_front"){
  rotate([0,-90,0])
    Uirt_front();
}

if(Uirt=="print_back"){
  rotate([0,90,0])Uirt_back();
}
